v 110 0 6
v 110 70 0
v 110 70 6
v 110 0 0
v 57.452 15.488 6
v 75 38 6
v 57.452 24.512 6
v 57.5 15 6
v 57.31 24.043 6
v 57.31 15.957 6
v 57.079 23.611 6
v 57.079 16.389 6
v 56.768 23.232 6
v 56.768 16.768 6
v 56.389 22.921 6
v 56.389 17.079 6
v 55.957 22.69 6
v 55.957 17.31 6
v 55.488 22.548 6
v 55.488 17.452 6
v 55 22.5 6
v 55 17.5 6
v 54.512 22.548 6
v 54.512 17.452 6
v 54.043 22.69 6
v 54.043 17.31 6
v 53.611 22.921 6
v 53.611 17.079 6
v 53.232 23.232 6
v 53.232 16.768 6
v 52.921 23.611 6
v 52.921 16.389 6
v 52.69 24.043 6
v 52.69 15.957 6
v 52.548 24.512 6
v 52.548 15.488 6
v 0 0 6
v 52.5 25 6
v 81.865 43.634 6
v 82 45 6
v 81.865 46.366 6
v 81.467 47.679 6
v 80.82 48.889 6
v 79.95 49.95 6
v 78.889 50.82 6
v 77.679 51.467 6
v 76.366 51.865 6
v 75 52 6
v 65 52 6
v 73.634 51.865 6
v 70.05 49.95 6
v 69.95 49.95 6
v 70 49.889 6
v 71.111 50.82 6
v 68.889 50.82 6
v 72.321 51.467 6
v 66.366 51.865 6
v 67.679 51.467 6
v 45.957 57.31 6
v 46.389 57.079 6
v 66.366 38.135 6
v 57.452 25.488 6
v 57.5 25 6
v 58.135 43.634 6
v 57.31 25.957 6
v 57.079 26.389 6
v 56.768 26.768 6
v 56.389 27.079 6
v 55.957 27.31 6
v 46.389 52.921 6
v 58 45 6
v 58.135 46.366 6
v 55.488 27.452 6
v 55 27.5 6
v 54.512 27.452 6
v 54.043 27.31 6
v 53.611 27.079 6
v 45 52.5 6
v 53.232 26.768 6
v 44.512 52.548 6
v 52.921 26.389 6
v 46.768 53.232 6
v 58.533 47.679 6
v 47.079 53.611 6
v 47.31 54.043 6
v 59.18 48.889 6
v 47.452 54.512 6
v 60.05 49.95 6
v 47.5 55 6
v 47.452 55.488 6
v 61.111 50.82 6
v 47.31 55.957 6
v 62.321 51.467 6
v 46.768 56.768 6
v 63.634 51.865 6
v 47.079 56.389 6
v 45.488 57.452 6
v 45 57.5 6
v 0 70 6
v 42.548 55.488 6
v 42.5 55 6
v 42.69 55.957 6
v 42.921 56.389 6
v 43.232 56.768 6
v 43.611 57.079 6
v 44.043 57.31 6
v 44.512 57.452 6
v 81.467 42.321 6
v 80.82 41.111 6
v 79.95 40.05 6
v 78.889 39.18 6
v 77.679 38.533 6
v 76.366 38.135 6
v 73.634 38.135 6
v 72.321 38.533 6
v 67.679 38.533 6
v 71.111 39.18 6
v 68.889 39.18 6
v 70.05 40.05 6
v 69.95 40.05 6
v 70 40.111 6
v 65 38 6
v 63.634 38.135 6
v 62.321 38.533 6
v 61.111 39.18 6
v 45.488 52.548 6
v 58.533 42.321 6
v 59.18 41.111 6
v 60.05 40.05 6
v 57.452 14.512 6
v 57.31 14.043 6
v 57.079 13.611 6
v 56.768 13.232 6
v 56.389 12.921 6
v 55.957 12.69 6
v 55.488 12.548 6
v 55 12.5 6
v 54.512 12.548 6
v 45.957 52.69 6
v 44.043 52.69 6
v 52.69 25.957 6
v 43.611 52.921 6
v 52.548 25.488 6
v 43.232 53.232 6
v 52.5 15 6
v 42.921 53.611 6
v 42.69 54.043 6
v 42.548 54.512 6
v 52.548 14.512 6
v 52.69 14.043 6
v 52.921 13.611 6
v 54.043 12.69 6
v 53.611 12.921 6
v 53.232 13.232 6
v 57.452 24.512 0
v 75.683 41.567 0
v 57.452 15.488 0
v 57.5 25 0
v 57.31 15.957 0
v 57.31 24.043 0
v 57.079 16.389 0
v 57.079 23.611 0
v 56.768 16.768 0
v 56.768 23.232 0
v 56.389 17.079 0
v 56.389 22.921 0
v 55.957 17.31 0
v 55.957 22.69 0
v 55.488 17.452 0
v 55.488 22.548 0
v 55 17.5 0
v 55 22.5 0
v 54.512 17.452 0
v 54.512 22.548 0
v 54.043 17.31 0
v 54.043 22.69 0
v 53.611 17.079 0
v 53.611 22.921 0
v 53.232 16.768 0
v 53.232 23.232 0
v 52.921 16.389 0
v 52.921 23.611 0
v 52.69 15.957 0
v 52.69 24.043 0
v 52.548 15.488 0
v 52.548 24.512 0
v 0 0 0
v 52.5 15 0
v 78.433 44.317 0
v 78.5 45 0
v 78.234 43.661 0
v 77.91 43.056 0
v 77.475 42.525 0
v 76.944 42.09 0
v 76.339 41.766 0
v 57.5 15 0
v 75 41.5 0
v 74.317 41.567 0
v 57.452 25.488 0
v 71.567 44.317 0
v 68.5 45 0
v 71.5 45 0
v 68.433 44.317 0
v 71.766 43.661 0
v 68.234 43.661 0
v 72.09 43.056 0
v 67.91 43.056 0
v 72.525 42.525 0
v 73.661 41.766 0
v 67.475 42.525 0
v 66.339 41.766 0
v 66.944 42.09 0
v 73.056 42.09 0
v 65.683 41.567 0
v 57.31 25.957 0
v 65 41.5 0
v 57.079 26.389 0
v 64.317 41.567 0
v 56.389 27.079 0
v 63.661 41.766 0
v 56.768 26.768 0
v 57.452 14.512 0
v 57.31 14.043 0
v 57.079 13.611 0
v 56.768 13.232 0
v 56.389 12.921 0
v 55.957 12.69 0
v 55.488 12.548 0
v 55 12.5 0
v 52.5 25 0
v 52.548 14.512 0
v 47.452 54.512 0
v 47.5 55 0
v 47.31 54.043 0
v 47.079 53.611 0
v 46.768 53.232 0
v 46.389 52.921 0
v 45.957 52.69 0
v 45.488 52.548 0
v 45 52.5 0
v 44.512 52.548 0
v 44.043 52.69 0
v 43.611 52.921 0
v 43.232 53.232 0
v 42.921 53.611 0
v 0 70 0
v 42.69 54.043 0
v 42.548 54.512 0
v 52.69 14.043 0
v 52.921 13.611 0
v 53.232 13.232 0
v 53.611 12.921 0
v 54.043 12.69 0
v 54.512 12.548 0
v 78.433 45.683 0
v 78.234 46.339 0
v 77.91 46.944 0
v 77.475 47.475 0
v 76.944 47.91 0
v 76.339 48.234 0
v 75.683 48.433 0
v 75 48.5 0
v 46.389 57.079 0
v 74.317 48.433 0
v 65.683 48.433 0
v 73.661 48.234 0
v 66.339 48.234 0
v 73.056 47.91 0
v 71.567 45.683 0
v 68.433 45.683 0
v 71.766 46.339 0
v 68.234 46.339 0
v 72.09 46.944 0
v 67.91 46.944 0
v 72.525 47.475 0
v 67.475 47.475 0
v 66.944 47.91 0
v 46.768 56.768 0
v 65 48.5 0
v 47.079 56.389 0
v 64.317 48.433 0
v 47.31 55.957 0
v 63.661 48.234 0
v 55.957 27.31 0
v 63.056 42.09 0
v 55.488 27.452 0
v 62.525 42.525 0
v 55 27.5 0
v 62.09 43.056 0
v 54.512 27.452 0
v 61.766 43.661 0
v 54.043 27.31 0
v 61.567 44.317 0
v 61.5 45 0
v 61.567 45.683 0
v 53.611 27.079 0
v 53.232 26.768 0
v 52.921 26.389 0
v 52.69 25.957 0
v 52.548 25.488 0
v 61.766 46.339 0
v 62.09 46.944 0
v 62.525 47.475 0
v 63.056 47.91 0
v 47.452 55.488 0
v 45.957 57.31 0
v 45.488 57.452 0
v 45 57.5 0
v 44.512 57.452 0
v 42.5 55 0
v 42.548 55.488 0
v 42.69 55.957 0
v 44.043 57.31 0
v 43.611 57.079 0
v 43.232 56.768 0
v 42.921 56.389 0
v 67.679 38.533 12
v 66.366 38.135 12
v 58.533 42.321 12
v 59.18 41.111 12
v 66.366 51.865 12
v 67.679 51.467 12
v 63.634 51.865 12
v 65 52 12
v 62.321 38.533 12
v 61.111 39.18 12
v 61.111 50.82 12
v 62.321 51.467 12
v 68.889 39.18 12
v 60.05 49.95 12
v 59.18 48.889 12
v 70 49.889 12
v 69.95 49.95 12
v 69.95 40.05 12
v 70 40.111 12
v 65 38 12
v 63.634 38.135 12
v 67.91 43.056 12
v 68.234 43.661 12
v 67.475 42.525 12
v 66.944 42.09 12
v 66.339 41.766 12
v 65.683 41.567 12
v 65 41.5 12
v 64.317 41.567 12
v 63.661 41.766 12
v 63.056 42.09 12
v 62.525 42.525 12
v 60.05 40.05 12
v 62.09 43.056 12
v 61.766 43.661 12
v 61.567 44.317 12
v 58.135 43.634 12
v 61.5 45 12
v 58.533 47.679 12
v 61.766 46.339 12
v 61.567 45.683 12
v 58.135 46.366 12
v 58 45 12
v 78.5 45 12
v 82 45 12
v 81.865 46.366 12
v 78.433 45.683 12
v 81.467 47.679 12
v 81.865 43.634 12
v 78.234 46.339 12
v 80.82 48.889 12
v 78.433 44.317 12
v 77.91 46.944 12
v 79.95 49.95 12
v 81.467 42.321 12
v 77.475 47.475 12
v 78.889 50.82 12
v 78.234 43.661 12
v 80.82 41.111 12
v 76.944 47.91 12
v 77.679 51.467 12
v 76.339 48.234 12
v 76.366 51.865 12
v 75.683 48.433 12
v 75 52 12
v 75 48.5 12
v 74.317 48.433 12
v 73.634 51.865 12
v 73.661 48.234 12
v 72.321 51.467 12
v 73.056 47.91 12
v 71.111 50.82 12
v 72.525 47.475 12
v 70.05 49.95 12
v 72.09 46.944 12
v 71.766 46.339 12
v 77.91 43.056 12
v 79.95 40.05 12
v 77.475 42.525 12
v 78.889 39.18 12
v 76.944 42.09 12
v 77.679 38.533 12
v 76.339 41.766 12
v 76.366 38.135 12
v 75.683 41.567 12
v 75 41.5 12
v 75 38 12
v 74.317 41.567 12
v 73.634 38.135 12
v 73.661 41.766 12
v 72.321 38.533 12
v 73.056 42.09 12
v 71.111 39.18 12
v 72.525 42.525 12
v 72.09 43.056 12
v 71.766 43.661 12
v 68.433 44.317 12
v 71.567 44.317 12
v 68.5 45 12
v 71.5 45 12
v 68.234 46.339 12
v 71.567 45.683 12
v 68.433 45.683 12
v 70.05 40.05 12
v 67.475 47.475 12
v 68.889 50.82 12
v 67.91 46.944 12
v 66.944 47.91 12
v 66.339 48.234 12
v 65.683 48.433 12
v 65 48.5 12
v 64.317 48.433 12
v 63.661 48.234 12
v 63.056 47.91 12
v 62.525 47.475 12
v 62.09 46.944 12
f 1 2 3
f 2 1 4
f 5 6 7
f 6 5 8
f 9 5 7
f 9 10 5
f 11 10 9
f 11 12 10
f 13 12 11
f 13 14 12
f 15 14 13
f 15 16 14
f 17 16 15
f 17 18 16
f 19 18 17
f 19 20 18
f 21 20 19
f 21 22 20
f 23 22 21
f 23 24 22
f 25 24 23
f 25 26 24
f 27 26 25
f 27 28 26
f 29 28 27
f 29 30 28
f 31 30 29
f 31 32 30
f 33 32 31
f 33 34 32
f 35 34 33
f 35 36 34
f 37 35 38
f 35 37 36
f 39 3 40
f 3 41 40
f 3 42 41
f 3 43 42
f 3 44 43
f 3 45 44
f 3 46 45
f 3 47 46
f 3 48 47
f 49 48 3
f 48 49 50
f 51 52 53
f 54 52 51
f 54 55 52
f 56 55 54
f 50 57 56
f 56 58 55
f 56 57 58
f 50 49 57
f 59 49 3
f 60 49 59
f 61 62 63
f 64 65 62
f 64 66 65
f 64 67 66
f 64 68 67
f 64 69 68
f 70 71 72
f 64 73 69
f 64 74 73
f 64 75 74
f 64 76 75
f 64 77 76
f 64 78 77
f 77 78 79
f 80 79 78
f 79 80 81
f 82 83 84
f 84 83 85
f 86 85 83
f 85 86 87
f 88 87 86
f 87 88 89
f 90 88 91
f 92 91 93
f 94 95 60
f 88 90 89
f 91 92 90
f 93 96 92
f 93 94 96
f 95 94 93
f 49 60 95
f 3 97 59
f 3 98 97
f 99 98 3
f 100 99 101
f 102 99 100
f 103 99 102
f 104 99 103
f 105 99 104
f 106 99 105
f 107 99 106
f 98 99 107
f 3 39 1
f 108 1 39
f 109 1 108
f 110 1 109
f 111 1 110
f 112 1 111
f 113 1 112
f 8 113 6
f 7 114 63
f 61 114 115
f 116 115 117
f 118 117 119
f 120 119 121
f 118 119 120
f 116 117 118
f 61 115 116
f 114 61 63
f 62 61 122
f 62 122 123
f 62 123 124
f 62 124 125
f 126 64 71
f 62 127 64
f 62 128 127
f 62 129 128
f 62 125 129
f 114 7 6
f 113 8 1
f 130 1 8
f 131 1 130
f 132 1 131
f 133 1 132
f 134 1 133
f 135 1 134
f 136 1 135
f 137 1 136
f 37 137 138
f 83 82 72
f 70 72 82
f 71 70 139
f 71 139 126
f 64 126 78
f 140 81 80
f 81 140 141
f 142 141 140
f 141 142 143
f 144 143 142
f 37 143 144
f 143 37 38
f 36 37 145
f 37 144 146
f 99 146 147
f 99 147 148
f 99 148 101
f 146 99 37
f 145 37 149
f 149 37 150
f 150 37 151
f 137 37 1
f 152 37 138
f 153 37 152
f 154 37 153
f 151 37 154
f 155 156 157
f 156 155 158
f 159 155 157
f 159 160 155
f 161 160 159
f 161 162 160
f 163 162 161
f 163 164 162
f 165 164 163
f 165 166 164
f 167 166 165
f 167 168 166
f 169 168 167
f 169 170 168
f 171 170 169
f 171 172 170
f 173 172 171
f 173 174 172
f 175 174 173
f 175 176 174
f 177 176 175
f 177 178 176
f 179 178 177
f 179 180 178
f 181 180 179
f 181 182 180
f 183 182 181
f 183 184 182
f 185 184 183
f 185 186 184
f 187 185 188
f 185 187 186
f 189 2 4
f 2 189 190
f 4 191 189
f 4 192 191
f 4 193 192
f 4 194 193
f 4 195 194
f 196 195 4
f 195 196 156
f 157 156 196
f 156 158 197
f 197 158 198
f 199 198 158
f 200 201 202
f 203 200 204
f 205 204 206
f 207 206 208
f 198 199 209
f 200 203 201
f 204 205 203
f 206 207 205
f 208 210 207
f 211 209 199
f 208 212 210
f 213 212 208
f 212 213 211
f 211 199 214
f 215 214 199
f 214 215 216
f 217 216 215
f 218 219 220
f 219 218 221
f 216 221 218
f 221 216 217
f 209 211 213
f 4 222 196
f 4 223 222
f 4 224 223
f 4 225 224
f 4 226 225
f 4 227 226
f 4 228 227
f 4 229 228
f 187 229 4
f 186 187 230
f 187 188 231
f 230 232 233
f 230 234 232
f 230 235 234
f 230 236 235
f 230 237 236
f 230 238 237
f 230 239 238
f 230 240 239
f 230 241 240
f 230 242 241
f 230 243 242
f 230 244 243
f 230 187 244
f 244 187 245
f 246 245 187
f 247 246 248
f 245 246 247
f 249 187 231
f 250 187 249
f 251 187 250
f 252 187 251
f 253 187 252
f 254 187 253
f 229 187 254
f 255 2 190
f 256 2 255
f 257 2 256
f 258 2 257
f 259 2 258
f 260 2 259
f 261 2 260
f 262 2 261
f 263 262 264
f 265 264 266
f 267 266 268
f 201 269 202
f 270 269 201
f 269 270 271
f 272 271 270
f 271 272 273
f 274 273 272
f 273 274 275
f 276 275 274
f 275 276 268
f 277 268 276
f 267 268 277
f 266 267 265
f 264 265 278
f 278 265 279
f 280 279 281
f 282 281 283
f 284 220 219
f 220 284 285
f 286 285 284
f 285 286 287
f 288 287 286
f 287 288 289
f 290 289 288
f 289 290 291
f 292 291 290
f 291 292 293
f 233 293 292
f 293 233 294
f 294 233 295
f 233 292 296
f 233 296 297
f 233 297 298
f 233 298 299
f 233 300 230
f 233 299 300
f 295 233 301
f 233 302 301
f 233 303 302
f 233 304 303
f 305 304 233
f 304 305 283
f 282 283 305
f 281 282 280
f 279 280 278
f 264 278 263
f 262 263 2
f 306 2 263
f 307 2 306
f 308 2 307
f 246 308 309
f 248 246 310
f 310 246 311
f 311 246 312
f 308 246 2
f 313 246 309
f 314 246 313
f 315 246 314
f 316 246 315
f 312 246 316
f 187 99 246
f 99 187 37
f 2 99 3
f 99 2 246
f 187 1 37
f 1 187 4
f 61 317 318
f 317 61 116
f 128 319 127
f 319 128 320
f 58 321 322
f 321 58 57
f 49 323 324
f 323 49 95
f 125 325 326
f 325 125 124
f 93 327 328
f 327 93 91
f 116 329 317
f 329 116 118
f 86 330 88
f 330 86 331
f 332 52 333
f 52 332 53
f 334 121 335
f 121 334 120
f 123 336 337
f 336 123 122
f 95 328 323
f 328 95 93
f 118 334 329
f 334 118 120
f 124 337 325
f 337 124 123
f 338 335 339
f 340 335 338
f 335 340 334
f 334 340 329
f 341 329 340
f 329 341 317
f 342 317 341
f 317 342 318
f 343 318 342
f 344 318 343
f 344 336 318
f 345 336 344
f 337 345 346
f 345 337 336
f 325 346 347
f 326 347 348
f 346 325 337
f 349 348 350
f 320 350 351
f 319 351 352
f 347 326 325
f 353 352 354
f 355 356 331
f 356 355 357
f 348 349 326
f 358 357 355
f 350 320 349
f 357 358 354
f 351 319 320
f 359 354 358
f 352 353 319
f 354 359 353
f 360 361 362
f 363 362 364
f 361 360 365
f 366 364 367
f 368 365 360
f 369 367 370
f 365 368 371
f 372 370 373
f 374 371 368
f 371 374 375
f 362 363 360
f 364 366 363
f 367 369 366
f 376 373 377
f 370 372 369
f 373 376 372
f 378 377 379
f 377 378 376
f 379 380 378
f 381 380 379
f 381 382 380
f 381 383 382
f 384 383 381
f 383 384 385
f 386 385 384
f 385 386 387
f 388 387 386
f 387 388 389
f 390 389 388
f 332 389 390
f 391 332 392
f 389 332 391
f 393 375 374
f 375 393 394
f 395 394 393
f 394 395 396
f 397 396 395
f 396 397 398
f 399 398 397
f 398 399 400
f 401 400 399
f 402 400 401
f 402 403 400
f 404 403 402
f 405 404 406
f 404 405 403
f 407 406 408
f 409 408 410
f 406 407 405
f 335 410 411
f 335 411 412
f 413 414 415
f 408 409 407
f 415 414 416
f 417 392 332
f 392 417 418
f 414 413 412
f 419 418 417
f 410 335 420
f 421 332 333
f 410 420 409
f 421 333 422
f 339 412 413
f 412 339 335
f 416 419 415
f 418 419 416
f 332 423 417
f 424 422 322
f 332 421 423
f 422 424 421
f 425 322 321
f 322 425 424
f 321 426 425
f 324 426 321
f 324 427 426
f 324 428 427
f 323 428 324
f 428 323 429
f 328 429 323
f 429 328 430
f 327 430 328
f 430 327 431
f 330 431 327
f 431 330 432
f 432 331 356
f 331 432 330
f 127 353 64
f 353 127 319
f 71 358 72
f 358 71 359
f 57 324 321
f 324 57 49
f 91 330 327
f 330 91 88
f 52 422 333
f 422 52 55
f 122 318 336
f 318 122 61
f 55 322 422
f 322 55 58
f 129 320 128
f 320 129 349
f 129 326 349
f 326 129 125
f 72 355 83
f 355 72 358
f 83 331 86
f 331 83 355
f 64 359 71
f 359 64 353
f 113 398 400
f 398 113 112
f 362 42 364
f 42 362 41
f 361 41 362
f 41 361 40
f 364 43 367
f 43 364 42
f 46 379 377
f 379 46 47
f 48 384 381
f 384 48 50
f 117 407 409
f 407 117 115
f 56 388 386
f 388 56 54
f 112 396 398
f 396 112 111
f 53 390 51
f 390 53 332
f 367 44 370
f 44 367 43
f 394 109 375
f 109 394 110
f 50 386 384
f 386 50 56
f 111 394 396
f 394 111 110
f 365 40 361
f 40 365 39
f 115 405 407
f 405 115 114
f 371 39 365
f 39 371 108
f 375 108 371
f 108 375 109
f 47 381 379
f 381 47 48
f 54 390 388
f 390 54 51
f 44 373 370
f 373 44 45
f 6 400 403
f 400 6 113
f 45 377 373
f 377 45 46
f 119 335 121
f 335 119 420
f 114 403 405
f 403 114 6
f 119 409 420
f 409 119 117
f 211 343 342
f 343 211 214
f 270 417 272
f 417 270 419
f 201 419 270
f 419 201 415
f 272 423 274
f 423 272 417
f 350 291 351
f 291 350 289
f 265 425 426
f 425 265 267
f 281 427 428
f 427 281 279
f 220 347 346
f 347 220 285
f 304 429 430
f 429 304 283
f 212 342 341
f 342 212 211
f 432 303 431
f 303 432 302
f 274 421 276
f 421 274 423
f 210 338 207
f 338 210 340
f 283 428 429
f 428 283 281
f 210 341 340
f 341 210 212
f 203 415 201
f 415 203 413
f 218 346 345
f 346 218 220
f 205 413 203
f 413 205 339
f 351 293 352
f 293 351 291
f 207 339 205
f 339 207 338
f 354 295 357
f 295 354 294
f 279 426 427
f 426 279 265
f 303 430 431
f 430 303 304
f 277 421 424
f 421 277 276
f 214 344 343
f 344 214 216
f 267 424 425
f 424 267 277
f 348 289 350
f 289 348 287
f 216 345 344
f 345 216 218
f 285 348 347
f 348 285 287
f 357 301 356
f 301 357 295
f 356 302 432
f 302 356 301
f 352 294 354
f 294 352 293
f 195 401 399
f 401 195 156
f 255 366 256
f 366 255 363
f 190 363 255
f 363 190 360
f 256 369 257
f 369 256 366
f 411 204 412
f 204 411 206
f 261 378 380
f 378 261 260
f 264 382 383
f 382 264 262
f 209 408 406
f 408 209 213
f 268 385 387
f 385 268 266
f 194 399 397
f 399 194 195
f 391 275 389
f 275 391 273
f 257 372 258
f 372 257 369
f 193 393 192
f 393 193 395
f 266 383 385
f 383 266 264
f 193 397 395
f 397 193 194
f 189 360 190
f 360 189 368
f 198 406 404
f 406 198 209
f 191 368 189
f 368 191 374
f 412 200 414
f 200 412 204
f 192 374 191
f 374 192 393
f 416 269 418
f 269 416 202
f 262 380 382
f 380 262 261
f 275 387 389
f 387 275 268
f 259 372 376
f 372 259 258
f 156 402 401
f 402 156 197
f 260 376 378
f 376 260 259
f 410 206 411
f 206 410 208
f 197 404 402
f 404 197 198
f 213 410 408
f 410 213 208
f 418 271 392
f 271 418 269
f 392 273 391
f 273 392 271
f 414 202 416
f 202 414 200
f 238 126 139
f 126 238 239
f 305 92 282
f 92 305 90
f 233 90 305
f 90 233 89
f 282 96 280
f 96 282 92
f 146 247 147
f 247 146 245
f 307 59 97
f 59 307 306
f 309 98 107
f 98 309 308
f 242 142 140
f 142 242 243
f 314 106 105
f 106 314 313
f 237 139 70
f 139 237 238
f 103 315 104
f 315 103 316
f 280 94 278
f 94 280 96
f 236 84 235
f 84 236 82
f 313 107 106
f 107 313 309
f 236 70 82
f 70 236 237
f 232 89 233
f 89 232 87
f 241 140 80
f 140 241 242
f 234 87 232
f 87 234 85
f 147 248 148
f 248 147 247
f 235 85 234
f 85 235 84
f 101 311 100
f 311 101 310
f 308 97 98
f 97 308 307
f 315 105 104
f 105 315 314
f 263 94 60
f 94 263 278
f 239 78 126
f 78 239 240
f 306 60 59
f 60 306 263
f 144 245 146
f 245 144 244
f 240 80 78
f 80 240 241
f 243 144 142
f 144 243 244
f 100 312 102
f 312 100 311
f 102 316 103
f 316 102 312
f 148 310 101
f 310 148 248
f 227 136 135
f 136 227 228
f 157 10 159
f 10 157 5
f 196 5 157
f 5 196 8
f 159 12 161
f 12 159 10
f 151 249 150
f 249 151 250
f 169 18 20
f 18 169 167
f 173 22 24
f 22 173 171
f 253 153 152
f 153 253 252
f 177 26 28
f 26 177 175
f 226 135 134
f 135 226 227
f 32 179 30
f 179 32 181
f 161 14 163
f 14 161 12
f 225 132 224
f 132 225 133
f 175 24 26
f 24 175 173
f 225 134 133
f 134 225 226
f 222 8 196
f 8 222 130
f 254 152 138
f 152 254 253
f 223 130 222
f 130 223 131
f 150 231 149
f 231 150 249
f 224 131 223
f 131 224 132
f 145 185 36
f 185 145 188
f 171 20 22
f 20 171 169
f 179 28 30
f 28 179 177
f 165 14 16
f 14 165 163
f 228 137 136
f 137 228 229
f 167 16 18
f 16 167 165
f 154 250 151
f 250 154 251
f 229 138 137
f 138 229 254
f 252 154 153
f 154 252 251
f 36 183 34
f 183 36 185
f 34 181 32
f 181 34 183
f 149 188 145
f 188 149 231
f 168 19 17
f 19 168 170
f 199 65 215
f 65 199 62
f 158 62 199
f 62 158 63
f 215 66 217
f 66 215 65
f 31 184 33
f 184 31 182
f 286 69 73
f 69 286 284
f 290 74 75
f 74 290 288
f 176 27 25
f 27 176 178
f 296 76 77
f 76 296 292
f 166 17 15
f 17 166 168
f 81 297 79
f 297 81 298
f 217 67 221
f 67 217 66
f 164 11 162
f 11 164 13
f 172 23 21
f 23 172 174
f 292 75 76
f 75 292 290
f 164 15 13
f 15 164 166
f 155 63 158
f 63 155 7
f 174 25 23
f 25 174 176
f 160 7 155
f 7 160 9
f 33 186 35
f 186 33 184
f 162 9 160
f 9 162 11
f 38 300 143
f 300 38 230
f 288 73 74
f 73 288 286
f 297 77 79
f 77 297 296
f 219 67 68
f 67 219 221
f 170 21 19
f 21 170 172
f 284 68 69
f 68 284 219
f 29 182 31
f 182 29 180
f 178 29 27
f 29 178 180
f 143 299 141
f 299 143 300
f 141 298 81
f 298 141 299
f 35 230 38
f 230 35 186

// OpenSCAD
$fn = 32;

// ----------------------------------------------------------------------
// Mixed field: bosses and holes at given coordinates
// ----------------------------------------------------------------------

// --- parameters (mm) ---
plate_l = 110;            // plate length, X
plate_w = 70;             // plate width, Y
plate_t = 6;              // plate thickness, Z
boss_d = 14;              // boss diameter
boss_h = 6;               // boss height above the plate
hole_d = 5;               // through hole diameter
fit_tol = 0.05;           // tolerance for press fits, mm
free_tol = 0.2;           // tolerance for clearance fits, mm

total_h = plate_t + boss_h;  // overall height

difference() {
  union() {
    cube([plate_l, plate_w, plate_t]);
    translate([65, 45, plate_t]) cylinder(h = boss_h, d = boss_d);
    translate([75, 45, plate_t]) cylinder(h = boss_h, d = boss_d);
  }
  translate([65, 45, -1]) cylinder(h = total_h + 2, d = boss_d / 2);
  translate([75, 45, -1]) cylinder(h = total_h + 2, d = boss_d / 2);
  translate([45, 55, -1]) cylinder(h = plate_t + 2, d = hole_d);
  translate([55, 15, -1]) cylinder(h = plate_t + 2, d = hole_d);
  translate([55, 25, -1]) cylinder(h = plate_t + 2, d = hole_d);
}
